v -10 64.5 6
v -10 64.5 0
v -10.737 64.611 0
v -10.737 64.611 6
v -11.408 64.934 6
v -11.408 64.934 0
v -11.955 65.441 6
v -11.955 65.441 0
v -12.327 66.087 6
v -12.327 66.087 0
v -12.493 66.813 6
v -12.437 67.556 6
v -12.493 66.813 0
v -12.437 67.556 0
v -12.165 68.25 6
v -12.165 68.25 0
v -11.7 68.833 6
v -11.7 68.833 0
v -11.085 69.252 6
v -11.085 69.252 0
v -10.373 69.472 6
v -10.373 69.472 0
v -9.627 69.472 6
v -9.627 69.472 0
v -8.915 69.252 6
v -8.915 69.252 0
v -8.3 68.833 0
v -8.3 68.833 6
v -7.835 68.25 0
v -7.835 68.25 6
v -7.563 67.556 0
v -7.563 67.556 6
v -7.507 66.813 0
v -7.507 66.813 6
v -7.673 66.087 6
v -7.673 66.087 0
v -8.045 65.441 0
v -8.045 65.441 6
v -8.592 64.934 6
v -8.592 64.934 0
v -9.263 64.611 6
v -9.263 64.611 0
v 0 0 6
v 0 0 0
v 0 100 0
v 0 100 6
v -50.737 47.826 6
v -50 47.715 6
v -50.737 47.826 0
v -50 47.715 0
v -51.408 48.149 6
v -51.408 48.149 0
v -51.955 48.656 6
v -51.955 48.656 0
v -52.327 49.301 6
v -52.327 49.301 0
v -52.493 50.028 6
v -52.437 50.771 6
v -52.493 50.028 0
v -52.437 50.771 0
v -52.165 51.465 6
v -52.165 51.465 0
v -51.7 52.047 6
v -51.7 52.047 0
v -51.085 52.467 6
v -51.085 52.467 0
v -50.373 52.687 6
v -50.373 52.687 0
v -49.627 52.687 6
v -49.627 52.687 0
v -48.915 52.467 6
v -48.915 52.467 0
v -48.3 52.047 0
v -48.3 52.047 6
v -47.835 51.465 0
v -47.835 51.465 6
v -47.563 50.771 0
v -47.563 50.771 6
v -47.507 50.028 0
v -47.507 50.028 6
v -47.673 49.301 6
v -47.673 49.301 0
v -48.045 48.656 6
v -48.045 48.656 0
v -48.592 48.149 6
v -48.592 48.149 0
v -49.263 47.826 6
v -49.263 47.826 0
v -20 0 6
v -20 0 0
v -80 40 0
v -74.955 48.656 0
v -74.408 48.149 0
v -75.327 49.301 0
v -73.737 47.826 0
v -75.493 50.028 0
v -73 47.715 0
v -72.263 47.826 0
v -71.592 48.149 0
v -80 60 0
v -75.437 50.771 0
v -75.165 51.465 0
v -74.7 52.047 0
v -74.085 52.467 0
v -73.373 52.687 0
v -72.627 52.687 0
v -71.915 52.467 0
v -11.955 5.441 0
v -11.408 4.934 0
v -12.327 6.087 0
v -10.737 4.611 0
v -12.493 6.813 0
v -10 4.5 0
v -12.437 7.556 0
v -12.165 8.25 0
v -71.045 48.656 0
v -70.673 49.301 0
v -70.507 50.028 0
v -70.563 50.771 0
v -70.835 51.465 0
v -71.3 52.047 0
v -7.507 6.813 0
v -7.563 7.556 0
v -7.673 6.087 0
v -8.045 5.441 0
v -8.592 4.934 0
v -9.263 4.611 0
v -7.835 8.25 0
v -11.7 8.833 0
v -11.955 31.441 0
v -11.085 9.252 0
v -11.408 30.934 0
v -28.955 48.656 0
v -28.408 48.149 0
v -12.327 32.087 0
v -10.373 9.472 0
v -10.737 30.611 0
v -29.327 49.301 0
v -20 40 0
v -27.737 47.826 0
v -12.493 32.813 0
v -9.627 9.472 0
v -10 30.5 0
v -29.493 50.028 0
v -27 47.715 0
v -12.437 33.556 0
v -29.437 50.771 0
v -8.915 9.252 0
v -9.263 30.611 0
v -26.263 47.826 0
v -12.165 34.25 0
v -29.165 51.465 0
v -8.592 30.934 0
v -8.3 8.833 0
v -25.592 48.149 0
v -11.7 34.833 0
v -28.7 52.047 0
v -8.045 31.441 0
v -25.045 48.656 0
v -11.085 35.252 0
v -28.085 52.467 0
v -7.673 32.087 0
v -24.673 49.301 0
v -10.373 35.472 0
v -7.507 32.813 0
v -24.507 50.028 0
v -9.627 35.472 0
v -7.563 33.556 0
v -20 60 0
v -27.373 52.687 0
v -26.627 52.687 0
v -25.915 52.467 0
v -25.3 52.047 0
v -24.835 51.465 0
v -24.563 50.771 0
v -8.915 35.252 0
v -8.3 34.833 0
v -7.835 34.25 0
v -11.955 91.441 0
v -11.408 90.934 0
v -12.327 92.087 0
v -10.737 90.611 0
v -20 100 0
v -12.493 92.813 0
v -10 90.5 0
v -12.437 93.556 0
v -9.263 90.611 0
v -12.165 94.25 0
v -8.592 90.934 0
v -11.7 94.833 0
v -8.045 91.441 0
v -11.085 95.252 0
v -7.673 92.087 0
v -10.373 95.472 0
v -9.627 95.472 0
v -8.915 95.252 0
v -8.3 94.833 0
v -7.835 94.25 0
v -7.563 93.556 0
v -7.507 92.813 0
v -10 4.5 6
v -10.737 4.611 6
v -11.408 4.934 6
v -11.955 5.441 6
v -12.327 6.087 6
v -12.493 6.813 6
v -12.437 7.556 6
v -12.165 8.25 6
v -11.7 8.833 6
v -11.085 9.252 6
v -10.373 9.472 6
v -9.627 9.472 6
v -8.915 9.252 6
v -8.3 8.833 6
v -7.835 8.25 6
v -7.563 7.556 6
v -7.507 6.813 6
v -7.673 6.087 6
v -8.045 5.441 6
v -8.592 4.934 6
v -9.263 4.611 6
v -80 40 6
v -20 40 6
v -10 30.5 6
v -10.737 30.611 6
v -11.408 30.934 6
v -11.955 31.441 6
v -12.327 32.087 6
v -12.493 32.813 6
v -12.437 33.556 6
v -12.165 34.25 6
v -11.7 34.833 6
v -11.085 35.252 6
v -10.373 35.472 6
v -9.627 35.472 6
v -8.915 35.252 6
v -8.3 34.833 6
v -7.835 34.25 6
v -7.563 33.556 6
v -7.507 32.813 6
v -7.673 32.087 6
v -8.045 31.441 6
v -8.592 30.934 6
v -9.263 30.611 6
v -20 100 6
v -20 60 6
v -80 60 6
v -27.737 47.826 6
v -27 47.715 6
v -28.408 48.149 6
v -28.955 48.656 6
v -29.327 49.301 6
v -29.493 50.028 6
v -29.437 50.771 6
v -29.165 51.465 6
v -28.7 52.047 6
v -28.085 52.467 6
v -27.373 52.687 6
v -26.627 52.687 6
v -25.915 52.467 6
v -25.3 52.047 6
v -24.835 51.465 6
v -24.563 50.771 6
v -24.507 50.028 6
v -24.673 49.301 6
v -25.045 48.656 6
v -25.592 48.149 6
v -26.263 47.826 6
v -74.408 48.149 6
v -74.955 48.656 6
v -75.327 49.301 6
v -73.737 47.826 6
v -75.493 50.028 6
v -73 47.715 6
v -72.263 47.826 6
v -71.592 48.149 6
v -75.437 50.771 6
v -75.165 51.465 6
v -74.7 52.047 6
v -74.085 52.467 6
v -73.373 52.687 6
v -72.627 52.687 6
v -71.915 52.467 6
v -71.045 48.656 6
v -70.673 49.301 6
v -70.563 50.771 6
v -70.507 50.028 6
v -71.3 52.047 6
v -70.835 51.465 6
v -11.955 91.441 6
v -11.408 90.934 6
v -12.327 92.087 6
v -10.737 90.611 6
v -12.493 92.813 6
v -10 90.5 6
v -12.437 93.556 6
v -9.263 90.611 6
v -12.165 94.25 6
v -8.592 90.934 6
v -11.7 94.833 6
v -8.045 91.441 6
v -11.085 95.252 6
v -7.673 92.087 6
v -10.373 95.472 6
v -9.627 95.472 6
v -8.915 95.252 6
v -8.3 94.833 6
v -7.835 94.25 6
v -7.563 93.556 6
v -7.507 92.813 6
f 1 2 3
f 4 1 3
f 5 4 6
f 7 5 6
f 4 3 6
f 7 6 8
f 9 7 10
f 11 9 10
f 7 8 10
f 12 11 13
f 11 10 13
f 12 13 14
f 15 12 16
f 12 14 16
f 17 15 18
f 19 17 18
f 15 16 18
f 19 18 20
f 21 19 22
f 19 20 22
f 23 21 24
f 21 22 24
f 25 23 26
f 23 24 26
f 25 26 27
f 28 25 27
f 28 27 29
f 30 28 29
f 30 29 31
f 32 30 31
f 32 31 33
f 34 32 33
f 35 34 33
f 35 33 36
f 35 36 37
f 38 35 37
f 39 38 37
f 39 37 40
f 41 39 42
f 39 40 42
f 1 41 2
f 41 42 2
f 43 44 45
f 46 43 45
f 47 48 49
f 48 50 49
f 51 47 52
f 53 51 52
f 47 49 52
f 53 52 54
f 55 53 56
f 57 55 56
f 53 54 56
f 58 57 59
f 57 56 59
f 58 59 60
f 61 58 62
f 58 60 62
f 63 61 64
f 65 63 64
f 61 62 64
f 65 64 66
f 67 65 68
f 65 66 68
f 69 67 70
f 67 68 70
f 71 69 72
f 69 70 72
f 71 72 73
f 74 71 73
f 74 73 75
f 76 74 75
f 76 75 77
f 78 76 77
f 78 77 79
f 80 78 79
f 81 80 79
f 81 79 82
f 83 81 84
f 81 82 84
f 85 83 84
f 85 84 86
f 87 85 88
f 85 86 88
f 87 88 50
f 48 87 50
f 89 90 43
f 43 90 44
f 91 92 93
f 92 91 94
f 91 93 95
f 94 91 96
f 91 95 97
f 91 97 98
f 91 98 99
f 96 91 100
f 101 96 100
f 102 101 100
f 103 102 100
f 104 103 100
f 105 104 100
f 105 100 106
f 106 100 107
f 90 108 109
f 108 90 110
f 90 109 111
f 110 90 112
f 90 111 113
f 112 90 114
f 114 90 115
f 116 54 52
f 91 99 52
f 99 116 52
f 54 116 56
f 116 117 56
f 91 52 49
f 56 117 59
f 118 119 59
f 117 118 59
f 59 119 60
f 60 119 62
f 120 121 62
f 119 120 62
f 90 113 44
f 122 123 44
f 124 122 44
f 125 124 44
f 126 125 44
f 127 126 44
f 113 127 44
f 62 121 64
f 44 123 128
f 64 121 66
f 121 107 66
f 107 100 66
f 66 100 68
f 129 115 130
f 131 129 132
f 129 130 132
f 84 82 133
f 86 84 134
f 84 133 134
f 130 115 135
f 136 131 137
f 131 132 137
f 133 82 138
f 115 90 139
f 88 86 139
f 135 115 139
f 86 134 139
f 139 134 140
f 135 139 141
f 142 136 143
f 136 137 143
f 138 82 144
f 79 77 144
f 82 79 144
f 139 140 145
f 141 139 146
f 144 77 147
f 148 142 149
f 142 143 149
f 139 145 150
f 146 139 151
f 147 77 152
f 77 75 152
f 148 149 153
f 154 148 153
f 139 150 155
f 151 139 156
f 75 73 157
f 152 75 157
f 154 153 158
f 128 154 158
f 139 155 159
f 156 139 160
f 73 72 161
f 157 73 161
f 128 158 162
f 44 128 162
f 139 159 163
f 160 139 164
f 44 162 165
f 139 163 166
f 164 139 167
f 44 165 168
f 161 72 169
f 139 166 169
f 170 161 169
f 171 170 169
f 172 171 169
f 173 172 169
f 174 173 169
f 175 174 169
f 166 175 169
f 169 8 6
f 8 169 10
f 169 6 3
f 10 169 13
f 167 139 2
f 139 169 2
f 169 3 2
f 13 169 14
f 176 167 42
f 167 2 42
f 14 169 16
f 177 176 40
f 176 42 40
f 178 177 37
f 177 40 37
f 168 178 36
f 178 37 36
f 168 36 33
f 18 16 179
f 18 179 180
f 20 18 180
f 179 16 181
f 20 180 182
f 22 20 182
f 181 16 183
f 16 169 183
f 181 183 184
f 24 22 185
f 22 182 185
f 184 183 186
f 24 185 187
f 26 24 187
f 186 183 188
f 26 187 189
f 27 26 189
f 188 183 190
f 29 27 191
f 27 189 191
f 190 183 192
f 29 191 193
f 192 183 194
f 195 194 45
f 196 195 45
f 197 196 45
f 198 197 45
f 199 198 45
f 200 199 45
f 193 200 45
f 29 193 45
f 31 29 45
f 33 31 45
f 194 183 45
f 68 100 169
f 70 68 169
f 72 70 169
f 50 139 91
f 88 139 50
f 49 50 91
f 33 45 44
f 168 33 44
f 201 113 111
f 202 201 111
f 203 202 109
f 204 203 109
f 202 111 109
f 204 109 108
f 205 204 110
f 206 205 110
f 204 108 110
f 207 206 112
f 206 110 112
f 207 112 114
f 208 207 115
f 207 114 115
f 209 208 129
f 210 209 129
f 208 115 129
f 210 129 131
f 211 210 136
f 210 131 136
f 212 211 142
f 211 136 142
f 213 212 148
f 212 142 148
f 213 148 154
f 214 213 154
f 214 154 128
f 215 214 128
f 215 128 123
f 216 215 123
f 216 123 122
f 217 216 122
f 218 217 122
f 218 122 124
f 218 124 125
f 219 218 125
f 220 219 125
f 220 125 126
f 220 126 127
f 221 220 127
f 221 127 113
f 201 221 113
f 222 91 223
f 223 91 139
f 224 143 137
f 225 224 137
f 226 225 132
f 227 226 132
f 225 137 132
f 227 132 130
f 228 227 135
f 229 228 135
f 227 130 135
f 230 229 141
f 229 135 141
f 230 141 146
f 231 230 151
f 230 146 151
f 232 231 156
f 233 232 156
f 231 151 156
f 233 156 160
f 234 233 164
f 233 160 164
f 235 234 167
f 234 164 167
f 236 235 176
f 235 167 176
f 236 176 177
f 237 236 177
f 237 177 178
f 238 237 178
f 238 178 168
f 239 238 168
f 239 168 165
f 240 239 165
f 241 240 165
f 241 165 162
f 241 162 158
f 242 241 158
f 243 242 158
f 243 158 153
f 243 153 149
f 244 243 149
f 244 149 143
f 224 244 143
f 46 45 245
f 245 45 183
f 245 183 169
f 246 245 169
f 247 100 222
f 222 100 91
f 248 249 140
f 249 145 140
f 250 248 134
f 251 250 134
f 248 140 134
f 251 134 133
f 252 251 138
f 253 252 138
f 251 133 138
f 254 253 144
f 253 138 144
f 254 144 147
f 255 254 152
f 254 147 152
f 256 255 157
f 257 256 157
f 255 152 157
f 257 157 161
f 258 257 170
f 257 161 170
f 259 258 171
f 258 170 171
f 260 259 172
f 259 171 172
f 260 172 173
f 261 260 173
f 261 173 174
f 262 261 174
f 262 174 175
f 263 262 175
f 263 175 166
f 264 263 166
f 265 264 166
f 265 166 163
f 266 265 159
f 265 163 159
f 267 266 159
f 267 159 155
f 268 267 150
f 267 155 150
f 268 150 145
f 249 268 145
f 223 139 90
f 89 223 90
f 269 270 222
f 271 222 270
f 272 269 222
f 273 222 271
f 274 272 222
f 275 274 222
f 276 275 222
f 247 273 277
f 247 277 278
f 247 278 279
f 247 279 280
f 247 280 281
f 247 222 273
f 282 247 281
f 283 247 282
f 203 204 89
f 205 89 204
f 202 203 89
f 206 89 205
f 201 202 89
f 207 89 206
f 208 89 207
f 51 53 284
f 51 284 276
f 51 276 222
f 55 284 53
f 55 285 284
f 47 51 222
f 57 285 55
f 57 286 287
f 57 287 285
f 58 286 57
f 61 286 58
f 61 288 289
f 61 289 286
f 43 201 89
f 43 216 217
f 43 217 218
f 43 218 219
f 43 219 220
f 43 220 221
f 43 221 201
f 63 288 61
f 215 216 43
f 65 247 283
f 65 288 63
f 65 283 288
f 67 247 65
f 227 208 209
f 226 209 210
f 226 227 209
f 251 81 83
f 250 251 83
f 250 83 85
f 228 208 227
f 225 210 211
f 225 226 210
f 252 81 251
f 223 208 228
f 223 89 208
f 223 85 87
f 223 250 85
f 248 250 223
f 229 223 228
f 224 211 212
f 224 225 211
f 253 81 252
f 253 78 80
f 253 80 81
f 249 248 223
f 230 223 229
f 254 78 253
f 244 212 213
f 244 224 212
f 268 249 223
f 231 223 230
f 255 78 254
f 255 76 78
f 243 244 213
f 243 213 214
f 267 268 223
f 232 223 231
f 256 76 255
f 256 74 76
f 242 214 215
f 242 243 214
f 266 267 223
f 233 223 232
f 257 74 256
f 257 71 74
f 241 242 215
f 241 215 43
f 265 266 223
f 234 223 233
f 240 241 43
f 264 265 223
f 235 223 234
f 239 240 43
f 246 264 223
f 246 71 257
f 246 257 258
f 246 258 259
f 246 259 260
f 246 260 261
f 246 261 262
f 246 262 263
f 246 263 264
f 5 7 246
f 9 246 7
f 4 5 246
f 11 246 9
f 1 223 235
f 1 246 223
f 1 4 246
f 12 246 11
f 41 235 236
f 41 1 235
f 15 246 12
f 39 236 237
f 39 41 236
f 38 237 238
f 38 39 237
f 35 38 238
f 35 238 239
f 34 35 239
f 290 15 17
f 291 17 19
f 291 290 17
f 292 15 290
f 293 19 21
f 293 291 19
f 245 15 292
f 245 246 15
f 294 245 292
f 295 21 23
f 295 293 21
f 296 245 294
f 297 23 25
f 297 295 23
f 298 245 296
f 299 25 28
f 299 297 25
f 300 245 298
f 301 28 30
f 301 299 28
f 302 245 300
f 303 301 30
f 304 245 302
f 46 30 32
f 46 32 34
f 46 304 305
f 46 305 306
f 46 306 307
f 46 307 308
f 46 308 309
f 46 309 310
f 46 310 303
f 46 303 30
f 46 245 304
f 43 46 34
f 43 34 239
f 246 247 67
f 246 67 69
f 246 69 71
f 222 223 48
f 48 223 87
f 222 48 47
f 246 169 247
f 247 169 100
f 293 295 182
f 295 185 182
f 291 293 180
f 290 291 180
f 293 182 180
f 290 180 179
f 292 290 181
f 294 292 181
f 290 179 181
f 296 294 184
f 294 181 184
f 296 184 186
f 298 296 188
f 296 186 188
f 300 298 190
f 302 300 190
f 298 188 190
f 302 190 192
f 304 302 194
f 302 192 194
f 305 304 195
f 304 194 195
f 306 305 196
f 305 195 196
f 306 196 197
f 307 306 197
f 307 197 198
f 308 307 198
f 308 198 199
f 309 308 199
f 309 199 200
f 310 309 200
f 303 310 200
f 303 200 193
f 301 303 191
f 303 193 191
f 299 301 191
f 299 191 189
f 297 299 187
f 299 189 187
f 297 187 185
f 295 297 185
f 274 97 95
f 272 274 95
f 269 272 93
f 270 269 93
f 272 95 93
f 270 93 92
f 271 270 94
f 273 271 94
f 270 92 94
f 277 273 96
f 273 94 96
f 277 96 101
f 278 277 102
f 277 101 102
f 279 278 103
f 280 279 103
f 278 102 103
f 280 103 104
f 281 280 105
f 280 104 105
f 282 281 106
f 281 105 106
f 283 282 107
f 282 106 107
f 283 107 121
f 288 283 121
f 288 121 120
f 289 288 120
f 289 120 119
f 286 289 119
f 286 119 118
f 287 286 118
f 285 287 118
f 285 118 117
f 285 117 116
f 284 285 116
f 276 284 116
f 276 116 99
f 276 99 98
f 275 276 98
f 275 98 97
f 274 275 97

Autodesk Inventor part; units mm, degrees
ref_plane "YZ Plane" through (0, 0, 0) normal (1, 0, 0) x (0, 1, 0)
ref_plane "XZ Plane" through (0, 0, 0) normal (0, 1, 0) x (-1, 0, 0)
ref_plane "XY Plane" through (0, 0, 0) normal (0, 0, 1) x (1, 0, 0)
sketch "Sketch1" plane through (0, 0, 0) normal (0, 0, 1) x (1, 0, 0)
  line L0 (0, 0) -> (0, 100)
  line L1 (0, 100) -> (-20, 100)
  line L2 (-20, 100) -> (-20, 60)
  line L3 (-20, 60) -> (-80, 60)
  line L4 (-80, 60) -> (-80, 40)
  line L5 (-80, 40) -> (-20, 40)
  line L6 (-20, 40) -> (-20, 0)
  line L7 (-20, 0) -> (0, 0)
  dimension "d0" = 20
  dimension "d1" = 100
  dimension "d2" = 20
  dimension "d3" = 40
  dimension "d4" = 60
extrude "Extrusion1" add sketch "Sketch1" along normal blind 6
sketch "Sketch2" plane through (0, 0, 6) normal (0, 0, 1) x (1, 0, 0)
  line L0 (0, 100) -> (-20, 100) projected
  line L1 (-20, 60) -> (-80, 60) projected
  line L2 (-80, 40) -> (-20, 40) projected
  line L3 (-20, 0) -> (0, 0) projected
  line L4 (-20, 40) -> (-20, 0) projected
  line L5 (-20, 100) -> (-20, 60) projected
  line L6 (-80, 60) -> (-80, 40) projected
  point P0 (-10, 93)
  point P1 (-10, 67)
  point P2 (-10, 33)
  point P3 (-10, 7)
  point P4 (-73, 50.2147)
  point P5 (-50, 50.2147)
  point P6 (-27, 50.2147)
  dimension "d7" = 7
  dimension "d8" = 7
  dimension "d9" = 7
  dimension "d10" = 7
  dimension "d11" = 10
  dimension "d12" = 10
  dimension "d13" = 10
  dimension "d14" = 10
  dimension "d15" = 7
  dimension "d16" = 7
  dimension "d17" = 23
hole "Hole1" at (-10, 93, 6) at (-10, 67, 6) at (-10, 33, 6) at (-10, 7, 6) at (-73, 50.2147, 6) at (-50, 50.2147, 6) at (-27, 50.2147, 6) direction (0, 0, -1) diameter 5 depth 8 tip angle 118
properties part number "side corner brackets"
